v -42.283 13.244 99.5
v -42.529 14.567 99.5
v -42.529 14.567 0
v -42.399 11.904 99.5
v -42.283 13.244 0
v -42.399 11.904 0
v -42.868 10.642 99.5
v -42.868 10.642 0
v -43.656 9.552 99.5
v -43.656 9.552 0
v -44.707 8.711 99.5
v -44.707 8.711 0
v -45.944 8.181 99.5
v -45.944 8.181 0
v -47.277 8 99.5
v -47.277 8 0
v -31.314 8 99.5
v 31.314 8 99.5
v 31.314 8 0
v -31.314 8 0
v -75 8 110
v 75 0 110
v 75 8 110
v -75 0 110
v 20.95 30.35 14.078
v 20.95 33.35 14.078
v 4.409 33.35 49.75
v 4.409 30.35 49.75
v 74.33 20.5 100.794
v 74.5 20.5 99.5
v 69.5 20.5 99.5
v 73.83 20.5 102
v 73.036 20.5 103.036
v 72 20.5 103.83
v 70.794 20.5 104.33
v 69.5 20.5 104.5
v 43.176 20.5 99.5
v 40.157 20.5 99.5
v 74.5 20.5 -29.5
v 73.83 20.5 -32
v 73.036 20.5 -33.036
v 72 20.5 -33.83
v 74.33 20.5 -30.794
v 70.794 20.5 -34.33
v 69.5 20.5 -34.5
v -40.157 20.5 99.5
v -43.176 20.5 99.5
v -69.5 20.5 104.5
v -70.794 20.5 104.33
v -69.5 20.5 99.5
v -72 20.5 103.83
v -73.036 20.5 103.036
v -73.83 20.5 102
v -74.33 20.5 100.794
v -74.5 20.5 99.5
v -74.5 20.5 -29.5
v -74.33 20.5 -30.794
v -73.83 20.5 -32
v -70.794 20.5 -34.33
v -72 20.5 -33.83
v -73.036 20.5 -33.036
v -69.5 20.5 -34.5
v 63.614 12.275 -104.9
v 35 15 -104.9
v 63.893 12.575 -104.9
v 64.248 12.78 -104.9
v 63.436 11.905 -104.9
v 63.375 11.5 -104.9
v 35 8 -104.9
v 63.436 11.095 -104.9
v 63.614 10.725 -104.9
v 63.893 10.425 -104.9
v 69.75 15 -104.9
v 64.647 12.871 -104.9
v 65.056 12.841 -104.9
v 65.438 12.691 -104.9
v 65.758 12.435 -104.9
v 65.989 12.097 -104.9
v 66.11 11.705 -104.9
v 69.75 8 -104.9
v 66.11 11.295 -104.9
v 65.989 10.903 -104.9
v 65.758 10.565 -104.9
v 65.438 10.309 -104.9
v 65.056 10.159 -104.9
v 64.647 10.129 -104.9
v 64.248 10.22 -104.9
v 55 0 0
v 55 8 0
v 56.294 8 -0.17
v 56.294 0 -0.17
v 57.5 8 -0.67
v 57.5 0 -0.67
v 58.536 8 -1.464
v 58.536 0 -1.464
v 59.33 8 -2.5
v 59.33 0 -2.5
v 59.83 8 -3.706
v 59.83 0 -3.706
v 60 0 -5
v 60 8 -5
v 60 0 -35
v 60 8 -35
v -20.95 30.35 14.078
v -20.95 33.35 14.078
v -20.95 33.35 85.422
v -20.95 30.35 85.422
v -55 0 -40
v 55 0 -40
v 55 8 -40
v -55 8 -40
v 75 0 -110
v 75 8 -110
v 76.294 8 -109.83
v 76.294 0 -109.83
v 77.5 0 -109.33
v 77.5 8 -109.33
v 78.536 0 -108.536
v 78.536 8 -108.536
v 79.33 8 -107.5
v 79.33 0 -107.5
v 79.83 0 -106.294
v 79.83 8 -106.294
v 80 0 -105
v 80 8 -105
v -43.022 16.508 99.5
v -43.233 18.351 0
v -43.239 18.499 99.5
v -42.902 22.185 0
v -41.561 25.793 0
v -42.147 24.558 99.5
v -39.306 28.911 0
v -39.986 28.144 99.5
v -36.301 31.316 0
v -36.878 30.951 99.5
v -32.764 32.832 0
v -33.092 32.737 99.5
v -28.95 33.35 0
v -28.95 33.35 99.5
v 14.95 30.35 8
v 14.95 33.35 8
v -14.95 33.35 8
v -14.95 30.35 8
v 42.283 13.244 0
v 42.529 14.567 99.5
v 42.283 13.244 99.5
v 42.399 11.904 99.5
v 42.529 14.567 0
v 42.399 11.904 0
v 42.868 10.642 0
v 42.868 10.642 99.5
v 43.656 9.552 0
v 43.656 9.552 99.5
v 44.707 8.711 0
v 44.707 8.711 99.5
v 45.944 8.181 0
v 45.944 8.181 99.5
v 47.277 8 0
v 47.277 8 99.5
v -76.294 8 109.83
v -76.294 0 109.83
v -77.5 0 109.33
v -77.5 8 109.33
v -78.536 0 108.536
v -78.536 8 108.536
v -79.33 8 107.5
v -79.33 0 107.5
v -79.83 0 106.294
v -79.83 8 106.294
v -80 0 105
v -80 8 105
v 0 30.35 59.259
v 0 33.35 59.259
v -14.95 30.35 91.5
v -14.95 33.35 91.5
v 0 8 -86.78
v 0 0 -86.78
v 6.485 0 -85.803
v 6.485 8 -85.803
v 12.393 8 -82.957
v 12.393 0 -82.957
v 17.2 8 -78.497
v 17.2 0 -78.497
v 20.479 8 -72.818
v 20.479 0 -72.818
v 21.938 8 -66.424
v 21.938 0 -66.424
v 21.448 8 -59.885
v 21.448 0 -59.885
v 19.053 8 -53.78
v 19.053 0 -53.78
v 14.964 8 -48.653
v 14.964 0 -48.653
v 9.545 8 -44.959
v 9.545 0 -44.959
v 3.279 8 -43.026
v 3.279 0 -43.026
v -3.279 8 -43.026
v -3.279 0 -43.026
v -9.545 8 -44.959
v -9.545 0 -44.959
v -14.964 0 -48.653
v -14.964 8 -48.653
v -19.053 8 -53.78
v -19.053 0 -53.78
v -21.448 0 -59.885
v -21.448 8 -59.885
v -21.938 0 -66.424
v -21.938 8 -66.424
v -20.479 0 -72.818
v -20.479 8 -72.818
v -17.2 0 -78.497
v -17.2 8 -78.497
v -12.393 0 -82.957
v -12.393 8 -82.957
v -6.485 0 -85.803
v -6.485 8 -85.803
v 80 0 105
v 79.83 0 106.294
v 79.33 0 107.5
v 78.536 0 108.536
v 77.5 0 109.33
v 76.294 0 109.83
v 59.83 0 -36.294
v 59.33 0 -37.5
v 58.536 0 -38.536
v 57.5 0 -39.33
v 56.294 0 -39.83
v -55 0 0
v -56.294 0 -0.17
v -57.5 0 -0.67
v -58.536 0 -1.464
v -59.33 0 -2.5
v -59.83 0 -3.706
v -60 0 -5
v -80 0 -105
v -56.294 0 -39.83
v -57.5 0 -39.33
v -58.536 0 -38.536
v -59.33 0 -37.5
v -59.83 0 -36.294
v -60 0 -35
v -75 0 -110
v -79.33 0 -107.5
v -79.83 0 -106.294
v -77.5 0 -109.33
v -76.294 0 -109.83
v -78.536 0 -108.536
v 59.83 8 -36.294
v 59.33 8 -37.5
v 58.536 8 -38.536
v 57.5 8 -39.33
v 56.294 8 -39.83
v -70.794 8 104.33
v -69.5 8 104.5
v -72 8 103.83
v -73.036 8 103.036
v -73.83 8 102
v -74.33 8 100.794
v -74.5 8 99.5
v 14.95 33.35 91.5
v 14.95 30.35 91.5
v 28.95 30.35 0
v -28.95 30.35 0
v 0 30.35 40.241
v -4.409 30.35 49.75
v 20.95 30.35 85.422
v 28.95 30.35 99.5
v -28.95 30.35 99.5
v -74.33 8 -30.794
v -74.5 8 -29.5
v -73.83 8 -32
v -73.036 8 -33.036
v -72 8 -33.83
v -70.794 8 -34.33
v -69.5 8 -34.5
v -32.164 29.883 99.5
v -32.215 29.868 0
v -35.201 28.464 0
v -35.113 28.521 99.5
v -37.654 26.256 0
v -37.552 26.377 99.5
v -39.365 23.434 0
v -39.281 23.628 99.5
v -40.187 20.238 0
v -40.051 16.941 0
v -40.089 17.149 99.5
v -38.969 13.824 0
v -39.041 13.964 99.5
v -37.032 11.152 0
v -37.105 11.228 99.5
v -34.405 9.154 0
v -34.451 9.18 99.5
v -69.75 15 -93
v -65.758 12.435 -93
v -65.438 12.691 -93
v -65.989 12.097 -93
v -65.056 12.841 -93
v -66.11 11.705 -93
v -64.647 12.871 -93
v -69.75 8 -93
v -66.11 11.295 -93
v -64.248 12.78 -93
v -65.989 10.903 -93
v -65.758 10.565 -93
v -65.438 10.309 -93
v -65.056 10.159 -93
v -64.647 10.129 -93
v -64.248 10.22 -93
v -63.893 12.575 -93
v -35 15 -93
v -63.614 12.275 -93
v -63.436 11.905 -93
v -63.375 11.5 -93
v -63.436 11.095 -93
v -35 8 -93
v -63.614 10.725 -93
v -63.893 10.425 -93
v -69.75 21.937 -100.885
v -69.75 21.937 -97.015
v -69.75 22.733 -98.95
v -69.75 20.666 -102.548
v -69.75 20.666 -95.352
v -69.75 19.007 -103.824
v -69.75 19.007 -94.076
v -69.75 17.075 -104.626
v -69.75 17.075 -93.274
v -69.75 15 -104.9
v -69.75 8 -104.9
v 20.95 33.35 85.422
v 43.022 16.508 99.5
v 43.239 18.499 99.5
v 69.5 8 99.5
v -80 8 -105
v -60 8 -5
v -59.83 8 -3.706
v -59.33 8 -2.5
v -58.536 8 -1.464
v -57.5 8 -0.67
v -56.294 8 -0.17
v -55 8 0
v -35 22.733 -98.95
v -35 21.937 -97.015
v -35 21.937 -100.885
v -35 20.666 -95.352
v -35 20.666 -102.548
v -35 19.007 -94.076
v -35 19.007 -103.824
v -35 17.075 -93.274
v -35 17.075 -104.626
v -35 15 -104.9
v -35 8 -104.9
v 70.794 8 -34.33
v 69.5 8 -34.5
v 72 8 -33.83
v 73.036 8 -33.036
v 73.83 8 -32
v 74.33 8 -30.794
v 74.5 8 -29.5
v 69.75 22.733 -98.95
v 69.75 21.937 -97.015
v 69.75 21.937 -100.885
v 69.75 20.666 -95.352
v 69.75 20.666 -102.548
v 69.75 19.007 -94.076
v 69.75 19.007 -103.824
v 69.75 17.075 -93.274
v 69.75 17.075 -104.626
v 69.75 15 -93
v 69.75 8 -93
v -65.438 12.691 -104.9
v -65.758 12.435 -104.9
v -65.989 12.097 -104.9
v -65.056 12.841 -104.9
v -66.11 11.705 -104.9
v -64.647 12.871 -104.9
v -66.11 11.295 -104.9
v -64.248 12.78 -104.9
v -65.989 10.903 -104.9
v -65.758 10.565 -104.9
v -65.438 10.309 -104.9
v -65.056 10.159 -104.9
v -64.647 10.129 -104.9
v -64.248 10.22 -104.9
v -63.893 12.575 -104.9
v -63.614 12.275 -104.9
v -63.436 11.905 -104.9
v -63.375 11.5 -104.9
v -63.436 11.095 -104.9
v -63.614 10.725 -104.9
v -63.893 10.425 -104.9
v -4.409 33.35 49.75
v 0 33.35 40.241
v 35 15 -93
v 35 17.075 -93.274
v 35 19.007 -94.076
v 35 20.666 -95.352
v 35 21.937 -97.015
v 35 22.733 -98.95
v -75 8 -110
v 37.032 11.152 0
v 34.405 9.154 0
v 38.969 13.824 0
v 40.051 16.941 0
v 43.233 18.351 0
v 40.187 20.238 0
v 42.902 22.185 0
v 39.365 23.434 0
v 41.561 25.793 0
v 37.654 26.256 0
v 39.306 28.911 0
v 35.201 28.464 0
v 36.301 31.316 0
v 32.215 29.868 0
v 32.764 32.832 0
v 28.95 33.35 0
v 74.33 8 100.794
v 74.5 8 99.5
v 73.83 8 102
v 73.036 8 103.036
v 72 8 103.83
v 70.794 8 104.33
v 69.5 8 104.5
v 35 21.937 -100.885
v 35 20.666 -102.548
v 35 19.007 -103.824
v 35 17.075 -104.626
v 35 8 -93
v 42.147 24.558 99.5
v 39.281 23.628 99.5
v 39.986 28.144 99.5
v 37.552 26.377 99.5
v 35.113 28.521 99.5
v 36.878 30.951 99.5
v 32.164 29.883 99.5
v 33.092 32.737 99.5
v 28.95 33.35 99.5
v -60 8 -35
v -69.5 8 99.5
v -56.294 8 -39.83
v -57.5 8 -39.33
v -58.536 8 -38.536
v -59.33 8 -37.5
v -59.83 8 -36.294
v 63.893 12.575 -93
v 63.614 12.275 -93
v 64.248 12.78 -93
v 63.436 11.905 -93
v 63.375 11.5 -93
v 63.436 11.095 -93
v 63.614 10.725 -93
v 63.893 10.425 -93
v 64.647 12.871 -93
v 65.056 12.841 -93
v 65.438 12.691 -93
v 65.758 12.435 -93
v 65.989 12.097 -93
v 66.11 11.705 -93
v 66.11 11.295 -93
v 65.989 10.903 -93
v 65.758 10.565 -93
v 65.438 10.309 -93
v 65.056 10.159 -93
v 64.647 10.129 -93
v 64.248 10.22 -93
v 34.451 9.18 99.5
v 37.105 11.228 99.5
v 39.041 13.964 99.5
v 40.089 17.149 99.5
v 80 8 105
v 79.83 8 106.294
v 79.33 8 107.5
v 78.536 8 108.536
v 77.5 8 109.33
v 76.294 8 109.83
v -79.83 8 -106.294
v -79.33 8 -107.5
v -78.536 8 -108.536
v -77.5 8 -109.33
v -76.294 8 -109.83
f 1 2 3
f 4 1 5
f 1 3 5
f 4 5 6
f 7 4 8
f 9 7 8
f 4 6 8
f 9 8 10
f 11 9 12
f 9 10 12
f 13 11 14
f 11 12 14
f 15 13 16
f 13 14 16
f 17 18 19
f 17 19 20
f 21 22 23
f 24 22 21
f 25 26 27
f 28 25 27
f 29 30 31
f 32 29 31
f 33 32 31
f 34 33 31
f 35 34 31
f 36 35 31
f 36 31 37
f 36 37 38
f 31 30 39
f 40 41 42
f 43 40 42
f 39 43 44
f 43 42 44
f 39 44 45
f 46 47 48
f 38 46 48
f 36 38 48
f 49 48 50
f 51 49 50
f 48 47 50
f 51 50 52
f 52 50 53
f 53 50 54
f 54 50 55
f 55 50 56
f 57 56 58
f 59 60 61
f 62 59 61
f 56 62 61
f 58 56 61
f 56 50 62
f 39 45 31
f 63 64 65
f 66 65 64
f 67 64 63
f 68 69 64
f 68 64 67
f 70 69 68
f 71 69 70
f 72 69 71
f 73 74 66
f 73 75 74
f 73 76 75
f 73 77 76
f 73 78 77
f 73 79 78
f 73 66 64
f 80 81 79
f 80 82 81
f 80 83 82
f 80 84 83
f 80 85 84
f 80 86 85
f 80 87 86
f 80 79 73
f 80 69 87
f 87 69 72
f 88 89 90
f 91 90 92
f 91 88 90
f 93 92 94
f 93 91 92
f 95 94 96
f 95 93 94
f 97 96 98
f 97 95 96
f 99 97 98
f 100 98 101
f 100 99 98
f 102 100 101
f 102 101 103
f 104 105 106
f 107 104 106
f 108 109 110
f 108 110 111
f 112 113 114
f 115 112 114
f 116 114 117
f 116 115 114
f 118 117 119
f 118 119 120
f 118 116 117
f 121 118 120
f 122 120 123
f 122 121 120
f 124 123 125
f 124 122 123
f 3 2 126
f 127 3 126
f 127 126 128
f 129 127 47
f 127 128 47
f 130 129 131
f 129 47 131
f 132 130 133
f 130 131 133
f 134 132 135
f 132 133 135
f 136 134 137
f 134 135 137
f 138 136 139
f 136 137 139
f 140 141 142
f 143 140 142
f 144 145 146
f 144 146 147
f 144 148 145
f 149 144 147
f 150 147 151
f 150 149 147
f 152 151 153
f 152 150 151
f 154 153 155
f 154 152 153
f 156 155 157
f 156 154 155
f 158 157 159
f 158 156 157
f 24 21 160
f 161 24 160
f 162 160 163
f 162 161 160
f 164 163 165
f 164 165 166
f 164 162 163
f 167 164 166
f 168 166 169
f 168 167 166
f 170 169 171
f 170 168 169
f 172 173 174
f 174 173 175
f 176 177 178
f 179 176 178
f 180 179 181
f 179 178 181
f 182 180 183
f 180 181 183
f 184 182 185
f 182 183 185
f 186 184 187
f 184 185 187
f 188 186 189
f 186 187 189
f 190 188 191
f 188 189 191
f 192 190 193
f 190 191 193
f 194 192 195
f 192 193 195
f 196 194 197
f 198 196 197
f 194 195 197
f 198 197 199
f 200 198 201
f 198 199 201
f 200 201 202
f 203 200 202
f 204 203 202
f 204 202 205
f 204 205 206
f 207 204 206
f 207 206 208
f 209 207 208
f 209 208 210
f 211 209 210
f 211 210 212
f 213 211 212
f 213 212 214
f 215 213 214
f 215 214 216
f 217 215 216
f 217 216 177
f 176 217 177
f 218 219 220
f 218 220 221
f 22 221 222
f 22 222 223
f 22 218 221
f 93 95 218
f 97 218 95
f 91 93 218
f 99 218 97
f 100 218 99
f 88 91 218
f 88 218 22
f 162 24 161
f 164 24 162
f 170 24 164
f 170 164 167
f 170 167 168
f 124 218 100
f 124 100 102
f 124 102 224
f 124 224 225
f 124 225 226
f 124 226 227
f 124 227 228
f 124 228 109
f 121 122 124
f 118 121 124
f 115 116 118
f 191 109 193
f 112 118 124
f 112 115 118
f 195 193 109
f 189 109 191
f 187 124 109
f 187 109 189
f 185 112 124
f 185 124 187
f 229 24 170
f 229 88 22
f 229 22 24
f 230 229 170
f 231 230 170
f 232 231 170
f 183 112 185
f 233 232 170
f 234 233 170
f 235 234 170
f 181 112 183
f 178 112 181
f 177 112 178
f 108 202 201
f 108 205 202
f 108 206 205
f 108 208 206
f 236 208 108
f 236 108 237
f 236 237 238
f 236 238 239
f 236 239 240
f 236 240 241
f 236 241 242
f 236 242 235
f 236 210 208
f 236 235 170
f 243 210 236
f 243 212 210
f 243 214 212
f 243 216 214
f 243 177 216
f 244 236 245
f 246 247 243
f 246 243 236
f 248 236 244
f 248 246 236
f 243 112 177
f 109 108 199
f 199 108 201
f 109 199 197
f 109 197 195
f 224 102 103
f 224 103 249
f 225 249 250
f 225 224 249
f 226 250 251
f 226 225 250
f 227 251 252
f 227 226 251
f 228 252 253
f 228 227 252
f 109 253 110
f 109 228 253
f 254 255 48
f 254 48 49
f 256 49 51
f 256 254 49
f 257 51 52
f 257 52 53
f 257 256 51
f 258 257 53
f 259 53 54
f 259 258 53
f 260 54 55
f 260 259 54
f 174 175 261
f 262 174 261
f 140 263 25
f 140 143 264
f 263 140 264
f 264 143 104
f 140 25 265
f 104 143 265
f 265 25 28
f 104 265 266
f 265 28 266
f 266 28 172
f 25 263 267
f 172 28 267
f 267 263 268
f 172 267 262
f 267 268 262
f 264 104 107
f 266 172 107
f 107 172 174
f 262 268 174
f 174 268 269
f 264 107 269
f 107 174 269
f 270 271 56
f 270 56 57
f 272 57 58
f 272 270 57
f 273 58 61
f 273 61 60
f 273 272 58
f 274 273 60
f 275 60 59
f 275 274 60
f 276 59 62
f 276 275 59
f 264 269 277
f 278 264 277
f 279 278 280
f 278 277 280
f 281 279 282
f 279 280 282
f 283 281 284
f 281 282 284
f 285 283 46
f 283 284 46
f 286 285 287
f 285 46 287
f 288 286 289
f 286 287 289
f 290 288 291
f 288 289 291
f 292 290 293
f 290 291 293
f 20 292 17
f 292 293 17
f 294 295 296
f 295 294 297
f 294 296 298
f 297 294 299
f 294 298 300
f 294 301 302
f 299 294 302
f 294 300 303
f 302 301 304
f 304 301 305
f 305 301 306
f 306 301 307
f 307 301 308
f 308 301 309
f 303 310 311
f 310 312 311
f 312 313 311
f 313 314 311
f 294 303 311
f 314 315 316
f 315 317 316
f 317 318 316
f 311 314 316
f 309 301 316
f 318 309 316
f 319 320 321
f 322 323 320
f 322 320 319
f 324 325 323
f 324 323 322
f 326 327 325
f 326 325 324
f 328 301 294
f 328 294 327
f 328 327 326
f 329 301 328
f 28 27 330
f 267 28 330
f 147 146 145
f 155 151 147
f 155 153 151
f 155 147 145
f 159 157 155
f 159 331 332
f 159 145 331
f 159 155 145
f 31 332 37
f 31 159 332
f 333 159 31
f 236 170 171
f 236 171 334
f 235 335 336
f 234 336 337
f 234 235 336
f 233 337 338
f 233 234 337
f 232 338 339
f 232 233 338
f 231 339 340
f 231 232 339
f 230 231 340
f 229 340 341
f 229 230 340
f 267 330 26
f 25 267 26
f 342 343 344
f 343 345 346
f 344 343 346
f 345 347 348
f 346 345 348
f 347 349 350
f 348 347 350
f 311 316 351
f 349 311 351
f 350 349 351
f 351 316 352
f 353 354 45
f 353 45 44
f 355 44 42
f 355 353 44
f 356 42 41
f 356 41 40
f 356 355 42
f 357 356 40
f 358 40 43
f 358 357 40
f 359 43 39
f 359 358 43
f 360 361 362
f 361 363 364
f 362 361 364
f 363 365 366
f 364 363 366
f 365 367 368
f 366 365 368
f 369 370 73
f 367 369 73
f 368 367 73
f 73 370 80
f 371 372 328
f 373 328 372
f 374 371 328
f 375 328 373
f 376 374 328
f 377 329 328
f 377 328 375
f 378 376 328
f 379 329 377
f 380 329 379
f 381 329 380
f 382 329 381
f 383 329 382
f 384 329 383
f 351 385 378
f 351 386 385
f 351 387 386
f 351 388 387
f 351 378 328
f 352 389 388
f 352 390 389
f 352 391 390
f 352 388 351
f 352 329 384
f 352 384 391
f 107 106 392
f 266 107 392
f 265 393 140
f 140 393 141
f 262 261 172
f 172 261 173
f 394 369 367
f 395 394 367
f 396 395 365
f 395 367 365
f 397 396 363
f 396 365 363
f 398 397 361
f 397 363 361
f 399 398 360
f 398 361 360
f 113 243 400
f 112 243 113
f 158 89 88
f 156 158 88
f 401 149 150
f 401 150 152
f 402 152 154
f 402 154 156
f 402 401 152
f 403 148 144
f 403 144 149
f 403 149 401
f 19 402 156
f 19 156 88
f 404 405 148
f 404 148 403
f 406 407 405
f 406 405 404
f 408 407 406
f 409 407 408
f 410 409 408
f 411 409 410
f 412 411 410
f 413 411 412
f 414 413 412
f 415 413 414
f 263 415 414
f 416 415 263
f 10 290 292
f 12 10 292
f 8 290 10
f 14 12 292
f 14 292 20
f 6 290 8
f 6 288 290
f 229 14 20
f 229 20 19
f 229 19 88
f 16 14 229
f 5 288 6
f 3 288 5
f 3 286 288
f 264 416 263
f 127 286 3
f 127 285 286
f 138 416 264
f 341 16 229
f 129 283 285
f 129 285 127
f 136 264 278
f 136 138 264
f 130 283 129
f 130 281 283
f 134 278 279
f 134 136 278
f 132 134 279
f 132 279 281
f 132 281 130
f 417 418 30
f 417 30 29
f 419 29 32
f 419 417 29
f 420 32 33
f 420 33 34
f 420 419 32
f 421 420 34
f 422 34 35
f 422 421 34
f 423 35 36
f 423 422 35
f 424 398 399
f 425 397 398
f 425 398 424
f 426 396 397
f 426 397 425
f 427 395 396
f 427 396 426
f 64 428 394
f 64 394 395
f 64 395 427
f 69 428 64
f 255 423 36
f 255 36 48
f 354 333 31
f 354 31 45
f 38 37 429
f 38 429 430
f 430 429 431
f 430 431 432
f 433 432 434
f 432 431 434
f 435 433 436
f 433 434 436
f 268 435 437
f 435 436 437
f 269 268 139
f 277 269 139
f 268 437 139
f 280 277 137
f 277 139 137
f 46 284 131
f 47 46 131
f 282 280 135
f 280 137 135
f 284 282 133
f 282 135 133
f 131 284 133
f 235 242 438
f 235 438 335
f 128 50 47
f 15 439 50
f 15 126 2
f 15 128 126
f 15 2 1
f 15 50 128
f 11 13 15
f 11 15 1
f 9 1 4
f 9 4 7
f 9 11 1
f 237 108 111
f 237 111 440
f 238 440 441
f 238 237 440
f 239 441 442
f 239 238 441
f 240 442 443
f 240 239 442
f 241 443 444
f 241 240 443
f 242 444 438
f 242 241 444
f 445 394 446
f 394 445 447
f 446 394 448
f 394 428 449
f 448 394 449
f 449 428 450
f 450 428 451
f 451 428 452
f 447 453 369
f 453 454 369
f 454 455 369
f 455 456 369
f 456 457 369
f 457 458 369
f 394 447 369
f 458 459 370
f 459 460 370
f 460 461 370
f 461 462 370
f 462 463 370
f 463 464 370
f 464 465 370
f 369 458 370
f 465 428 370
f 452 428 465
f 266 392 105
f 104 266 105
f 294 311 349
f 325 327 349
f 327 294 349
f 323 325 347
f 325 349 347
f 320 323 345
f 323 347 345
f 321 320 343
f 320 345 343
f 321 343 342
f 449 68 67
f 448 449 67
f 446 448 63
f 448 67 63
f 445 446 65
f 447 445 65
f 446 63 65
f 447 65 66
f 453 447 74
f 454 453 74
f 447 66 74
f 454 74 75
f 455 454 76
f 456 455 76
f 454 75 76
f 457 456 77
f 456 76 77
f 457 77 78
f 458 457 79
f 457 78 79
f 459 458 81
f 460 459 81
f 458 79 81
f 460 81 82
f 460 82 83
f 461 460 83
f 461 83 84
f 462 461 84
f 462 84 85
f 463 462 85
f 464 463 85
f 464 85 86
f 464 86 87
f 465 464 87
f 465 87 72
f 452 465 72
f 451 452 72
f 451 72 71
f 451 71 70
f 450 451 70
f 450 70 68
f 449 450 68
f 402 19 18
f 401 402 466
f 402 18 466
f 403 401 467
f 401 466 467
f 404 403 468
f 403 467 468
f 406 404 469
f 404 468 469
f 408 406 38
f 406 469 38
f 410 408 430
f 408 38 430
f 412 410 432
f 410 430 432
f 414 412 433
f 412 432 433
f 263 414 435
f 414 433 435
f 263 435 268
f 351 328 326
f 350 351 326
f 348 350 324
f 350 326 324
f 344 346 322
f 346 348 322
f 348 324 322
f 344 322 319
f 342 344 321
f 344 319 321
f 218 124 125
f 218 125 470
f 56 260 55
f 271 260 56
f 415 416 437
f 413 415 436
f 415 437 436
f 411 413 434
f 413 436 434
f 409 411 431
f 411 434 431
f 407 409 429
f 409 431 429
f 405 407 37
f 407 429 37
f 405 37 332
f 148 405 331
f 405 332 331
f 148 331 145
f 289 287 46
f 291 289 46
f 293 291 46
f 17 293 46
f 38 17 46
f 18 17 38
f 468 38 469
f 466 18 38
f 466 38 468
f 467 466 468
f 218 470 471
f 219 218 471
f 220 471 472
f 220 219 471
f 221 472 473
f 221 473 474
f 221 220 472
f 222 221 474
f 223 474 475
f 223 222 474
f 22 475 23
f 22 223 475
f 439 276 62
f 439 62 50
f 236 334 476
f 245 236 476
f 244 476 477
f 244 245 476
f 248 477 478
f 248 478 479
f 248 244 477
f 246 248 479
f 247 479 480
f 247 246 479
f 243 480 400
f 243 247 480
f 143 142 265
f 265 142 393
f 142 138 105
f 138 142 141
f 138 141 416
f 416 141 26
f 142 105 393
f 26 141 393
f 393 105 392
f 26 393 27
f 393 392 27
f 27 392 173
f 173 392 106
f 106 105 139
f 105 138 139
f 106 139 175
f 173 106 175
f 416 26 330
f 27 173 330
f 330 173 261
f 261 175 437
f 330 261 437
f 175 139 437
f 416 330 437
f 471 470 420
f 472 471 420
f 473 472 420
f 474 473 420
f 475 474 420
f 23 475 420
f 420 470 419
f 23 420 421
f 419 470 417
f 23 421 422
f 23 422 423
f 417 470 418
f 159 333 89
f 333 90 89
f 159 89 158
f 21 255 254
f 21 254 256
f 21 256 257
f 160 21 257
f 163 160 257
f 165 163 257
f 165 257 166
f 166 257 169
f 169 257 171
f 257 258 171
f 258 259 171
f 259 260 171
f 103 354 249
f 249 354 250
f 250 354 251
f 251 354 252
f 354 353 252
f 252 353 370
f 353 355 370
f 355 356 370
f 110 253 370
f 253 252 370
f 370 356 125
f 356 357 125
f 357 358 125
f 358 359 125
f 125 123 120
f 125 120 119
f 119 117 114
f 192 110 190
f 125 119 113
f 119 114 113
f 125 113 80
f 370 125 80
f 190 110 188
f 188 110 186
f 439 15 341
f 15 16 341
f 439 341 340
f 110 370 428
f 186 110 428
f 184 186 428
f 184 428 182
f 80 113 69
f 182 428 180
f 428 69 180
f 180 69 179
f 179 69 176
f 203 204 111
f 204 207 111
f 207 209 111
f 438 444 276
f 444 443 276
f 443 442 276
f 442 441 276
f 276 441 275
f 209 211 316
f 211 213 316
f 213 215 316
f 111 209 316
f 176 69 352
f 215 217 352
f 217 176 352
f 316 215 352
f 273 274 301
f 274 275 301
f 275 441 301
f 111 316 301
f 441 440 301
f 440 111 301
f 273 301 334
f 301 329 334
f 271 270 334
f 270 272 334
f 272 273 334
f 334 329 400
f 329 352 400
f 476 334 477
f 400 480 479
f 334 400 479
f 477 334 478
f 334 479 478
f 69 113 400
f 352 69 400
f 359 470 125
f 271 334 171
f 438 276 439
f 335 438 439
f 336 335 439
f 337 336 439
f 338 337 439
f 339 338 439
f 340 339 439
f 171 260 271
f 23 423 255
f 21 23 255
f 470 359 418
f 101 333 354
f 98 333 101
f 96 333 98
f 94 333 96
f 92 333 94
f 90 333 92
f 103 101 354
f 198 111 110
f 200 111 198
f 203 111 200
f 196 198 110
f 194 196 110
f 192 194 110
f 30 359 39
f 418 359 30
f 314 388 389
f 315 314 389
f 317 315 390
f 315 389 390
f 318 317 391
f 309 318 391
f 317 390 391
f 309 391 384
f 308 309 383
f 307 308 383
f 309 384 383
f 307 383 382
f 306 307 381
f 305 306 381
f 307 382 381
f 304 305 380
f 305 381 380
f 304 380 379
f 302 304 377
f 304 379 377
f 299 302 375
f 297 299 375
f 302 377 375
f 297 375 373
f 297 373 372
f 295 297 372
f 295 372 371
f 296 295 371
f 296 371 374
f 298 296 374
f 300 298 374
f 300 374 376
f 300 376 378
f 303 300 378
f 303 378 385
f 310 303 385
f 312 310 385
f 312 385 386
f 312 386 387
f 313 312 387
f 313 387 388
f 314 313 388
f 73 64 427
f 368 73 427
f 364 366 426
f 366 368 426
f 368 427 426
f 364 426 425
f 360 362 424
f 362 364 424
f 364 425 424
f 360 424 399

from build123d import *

# Parameters (mm, degrees)
BOSS_EXTRUDE1_DEPTH = 8
BOSS_EXTRUDE2_START = 8
SKETCH3_7_W         = 139.5
SKETCH3_7_H         = 11.9
BOSS_EXTRUDE2_DEPTH = 15
FILLET1_R           = 8
CUT_EXTRUDE1_REACH  = 139.901
BOSS_EXTRUDE3_DEPTH = 12.5
CUT_EXTRUDE2_REACH  = 232.432
SKETCH6_R           = 1.375
BOSS_EXTRUDE4_DEPTH = 99.5
FILLET2_R           = 5
CUT_EXTRUDE3_REACH  = 140.357
SKETCH9_W           = 70
SKETCH9_H           = 11.9
CUT_EXTRUDE4_REACH  = 142.044
CUT_EXTRUDE5_REACH  = 142.044
SKETCH11_R          = 22


with BuildPart() as part:
    # Sketch3 → Boss-Extrude1 (new body)
    with BuildSketch(Plane(origin=(0, 0, 0), x_dir=(1, 0, 0), z_dir=(0, 1, 0))):
        with BuildLine():
            Line((-75, 110), (75, 110))
            ThreePointArc((75, 110), (78.535533906, 108.535533906), (80, 105))
            Line((80, 105), (80, -105))
            ThreePointArc((80, -105), (78.535533906, -108.535533906), (75, -110))
            Line((75, -110), (-75, -110))
            ThreePointArc((-75, -110), (-78.535533906, -108.535533906), (-80, -105))
            Line((-80, -105), (-80, 105))
            ThreePointArc((-80, 105), (-78.535533906, 108.535533906), (-75, 110))
        make_face()
    extrude(amount=BOSS_EXTRUDE1_DEPTH)

    # Sketch3<7> → Boss-Extrude2 (add)
    with BuildSketch(Plane(origin=(0, 0, 0), x_dir=(1, 0, 0), z_dir=(0, 1, 0)).offset(BOSS_EXTRUDE2_START)):
        with Locations((0, 98.95)):
            Rectangle(SKETCH3_7_W, SKETCH3_7_H)
    extrude(amount=BOSS_EXTRUDE2_DEPTH)

    # Fillet1
    # the kernel refuses this fillet: 8 mm, written as the material it takes off along each edge
    with BuildSketch(Plane(origin=(89.75, 23, -93), x_dir=(0, -1, 0), z_dir=(-1, 0, 0)), Plane(origin=(-89.75, 23, -104.9), x_dir=(0, -1, 0), z_dir=(1, 0, 0))) as fillet1_piece_1:
        with BuildLine():
            CenterArc((FILLET1_R, -FILLET1_R), FILLET1_R, 90, 90)
            Line((0, -FILLET1_R), (0, 0))
            Line((0, 0), (FILLET1_R, 0))
        make_face()
    extrude(amount=179.5, mode=Mode.SUBTRACT)

    # Sketch4 → Cut-Extrude1 (cut, up to next)
    with BuildSketch(Plane.XZ, mode=Mode.PRIVATE) as cut_extrude1_sk1:
        with BuildLine():
            Line((-55, 0), (55, 0))
            ThreePointArc((55, 0), (58.535533906, -1.464466094), (60, -5))
            Line((60, -5), (60, -35))
            ThreePointArc((60, -35), (58.535533906, -38.535533906), (55, -40))
            Line((55, -40), (-55, -40))
            ThreePointArc((-55, -40), (-58.535533906, -38.535533906), (-60, -35))
            Line((-60, -35), (-60, -5))
            ThreePointArc((-60, -5), (-58.535533906, -1.464466094), (-55, 0))
        make_face()
    cut_extrude1_tool1 = extrude(cut_extrude1_sk1.sketch, amount=-CUT_EXTRUDE1_REACH, mode=Mode.PRIVATE) & part.part
    add(cut_extrude1_tool1.solids().sort_by_distance((0, 0, -20))[0], mode=Mode.SUBTRACT)

    # Sketch5 → Boss-Extrude3 (add)
    with BuildSketch(Plane(origin=(0, 8, 0), x_dir=(1, 0, 0), z_dir=(0, 1, 0))):
        with BuildLine():
            ThreePointArc((-69.5, -104.5), (-73.035533906, -103.035533906), (-74.5, -99.5))
            Line((-74.5, -99.5), (-74.5, 29.5))
            ThreePointArc((-74.5, 29.5), (-73.035533906, 33.035533906), (-69.5, 34.5))
            Line((-69.5, 34.5), (-69.5, -99.5))
            Line((-69.5, -99.5), (69.5, -99.5))
            Line((69.5, -99.5), (69.5, 34.5))
            ThreePointArc((69.5, 34.5), (73.035533906, 33.035533906), (74.5, 29.5))
            Line((74.5, 29.5), (74.5, -99.5))
            ThreePointArc((74.5, -99.5), (73.035533906, -103.035533906), (69.5, -104.5))
            Line((69.5, -104.5), (-69.5, -104.5))
        make_face()
    extrude(amount=BOSS_EXTRUDE3_DEPTH)

    # Sketch6 → Cut-Extrude2 (cut, up to next)
    with BuildSketch(Plane(origin=(0, 0, -104.9), x_dir=(-1, 0, 0), z_dir=(0, 0, -1)), mode=Mode.PRIVATE) as cut_extrude2_sk1:
        with Locations((-64.75, 11.5)):
            Circle(SKETCH6_R)
    cut_extrude2_tool1 = extrude(cut_extrude2_sk1.sketch, amount=-CUT_EXTRUDE2_REACH, mode=Mode.PRIVATE) & part.part
    # Sketch6 → Cut-Extrude2 (cut, up to next)
    with BuildSketch(Plane(origin=(0, 0, -104.9), x_dir=(-1, 0, 0), z_dir=(0, 0, -1)), mode=Mode.PRIVATE) as cut_extrude2_sk2:
        with Locations(Location((64.75, 11.5, 0), (0, 0, 180))):
            Circle(SKETCH6_R)
    cut_extrude2_tool2 = extrude(cut_extrude2_sk2.sketch, amount=-CUT_EXTRUDE2_REACH, mode=Mode.PRIVATE) & part.part
    add(cut_extrude2_tool1.solids().sort_by_distance((64.75, 11.5, -104.9))[0], mode=Mode.SUBTRACT)
    add(cut_extrude2_tool2.solids().sort_by_distance((-64.75, 11.5, -104.9))[0], mode=Mode.SUBTRACT)

    # Sketch8 → Boss-Extrude4 (add)
    with BuildSketch(Plane(origin=(0, 0, 99.5), x_dir=(-1, 0, 0), z_dir=(0, 0, -1))):
        with BuildLine():
            Line((-38.026756028, 8), (-31.313789331, 8))
            ThreePointArc((-31.313789331, 8), (-40.187326194, 20.238486432), (-28.95, 30.35))
            Line((-28.95, 30.35), (28.95, 30.35))
            ThreePointArc((28.95, 30.35), (40.187326194, 20.238486432), (31.313789331, 8))
            Line((31.313789331, 8), (38.026756028, 8))
            ThreePointArc((38.026756028, 8), (42.413004865, 23.870529017), (28.95, 33.35))
            Line((28.95, 33.35), (-28.95, 33.35))
            ThreePointArc((-28.95, 33.35), (-42.413004865, 23.870529017), (-38.026756028, 8))
        make_face()
    extrude(amount=BOSS_EXTRUDE4_DEPTH)

    # Fillet2
    fillet2_edges = [part.edges().sort_by_distance(p)[0] for p in [
        (-38.026756028, 8, 49.75),
        (38.026756028, 8, 49.75),
    ]]
    fillet(fillet2_edges, radius=FILLET2_R)

    # Sketch9 → Cut-Extrude3 (cut, up to next)
    with BuildSketch(Plane(origin=(0, 8, 0), x_dir=(1, 0, 0), z_dir=(0, 1, 0)), mode=Mode.PRIVATE) as cut_extrude3_sk1:
        with Locations((0, 98.95)):
            Rectangle(SKETCH9_W, SKETCH9_H)
    cut_extrude3_tool1 = extrude(cut_extrude3_sk1.sketch, amount=CUT_EXTRUDE3_REACH, mode=Mode.PRIVATE) & part.part
    add(cut_extrude3_tool1.solids().sort_by_distance((0, 8, -98.95))[0], mode=Mode.SUBTRACT)

    # Sketch10 → Cut-Extrude4 (cut, up to next)
    with BuildSketch(Plane(origin=(0, 33.35, 0), x_dir=(1, 0, 0), z_dir=(0, 1, 0)), mode=Mode.PRIVATE) as cut_extrude4_sk1:
        Polygon((4.409098458, -49.75), (20.95, -85.422252035), (20.95, -14.077747965), align=None)
    cut_extrude4_tool1 = extrude(cut_extrude4_sk1.sketch, amount=-CUT_EXTRUDE4_REACH, mode=Mode.PRIVATE) & part.part
    # Sketch10 → Cut-Extrude4 (cut, up to next)
    with BuildSketch(Plane(origin=(0, 33.35, 0), x_dir=(1, 0, 0), z_dir=(0, 1, 0)), mode=Mode.PRIVATE) as cut_extrude4_sk2:
        Polygon((0, -59.258700058), (-14.95, -91.5), (14.95, -91.5), align=None)
    cut_extrude4_tool2 = extrude(cut_extrude4_sk2.sketch, amount=-CUT_EXTRUDE4_REACH, mode=Mode.PRIVATE) & part.part
    # Sketch10 → Cut-Extrude4 (cut, up to next)
    with BuildSketch(Plane(origin=(0, 33.35, 0), x_dir=(1, 0, 0), z_dir=(0, 1, 0)), mode=Mode.PRIVATE) as cut_extrude4_sk3:
        Polygon((14.95, -8), (-14.95, -8), (0, -40.241299942), align=None)
    cut_extrude4_tool3 = extrude(cut_extrude4_sk3.sketch, amount=-CUT_EXTRUDE4_REACH, mode=Mode.PRIVATE) & part.part
    # Sketch10 → Cut-Extrude4 (cut, up to next)
    with BuildSketch(Plane(origin=(0, 33.35, 0), x_dir=(1, 0, 0), z_dir=(0, 1, 0)), mode=Mode.PRIVATE) as cut_extrude4_sk4:
        Polygon((-20.95, -14.077747965), (-20.95, -85.422252035), (-4.409098458, -49.75), align=None)
    cut_extrude4_tool4 = extrude(cut_extrude4_sk4.sketch, amount=-CUT_EXTRUDE4_REACH, mode=Mode.PRIVATE) & part.part
    add(cut_extrude4_tool1.solids().sort_by_distance((15.436366, 33.35, 49.75))[0], mode=Mode.SUBTRACT)
    add(cut_extrude4_tool2.solids().sort_by_distance((0, 33.35, 80.7529))[0], mode=Mode.SUBTRACT)
    add(cut_extrude4_tool3.solids().sort_by_distance((0, 33.35, 18.7471))[0], mode=Mode.SUBTRACT)
    add(cut_extrude4_tool4.solids().sort_by_distance((-15.436366, 33.35, 49.75))[0], mode=Mode.SUBTRACT)

    # Sketch11 → Cut-Extrude5 (cut, up to next)
    with BuildSketch(Plane.XZ, mode=Mode.PRIVATE) as cut_extrude5_sk1:
        with Locations(Location((0, -64.78, 0), (0, 0, 270))):
            Circle(SKETCH11_R)
    cut_extrude5_tool1 = extrude(cut_extrude5_sk1.sketch, amount=-CUT_EXTRUDE5_REACH, mode=Mode.PRIVATE) & part.part
    add(cut_extrude5_tool1.solids().sort_by_distance((0, 0, -64.78))[0], mode=Mode.SUBTRACT)


solid = part.part
